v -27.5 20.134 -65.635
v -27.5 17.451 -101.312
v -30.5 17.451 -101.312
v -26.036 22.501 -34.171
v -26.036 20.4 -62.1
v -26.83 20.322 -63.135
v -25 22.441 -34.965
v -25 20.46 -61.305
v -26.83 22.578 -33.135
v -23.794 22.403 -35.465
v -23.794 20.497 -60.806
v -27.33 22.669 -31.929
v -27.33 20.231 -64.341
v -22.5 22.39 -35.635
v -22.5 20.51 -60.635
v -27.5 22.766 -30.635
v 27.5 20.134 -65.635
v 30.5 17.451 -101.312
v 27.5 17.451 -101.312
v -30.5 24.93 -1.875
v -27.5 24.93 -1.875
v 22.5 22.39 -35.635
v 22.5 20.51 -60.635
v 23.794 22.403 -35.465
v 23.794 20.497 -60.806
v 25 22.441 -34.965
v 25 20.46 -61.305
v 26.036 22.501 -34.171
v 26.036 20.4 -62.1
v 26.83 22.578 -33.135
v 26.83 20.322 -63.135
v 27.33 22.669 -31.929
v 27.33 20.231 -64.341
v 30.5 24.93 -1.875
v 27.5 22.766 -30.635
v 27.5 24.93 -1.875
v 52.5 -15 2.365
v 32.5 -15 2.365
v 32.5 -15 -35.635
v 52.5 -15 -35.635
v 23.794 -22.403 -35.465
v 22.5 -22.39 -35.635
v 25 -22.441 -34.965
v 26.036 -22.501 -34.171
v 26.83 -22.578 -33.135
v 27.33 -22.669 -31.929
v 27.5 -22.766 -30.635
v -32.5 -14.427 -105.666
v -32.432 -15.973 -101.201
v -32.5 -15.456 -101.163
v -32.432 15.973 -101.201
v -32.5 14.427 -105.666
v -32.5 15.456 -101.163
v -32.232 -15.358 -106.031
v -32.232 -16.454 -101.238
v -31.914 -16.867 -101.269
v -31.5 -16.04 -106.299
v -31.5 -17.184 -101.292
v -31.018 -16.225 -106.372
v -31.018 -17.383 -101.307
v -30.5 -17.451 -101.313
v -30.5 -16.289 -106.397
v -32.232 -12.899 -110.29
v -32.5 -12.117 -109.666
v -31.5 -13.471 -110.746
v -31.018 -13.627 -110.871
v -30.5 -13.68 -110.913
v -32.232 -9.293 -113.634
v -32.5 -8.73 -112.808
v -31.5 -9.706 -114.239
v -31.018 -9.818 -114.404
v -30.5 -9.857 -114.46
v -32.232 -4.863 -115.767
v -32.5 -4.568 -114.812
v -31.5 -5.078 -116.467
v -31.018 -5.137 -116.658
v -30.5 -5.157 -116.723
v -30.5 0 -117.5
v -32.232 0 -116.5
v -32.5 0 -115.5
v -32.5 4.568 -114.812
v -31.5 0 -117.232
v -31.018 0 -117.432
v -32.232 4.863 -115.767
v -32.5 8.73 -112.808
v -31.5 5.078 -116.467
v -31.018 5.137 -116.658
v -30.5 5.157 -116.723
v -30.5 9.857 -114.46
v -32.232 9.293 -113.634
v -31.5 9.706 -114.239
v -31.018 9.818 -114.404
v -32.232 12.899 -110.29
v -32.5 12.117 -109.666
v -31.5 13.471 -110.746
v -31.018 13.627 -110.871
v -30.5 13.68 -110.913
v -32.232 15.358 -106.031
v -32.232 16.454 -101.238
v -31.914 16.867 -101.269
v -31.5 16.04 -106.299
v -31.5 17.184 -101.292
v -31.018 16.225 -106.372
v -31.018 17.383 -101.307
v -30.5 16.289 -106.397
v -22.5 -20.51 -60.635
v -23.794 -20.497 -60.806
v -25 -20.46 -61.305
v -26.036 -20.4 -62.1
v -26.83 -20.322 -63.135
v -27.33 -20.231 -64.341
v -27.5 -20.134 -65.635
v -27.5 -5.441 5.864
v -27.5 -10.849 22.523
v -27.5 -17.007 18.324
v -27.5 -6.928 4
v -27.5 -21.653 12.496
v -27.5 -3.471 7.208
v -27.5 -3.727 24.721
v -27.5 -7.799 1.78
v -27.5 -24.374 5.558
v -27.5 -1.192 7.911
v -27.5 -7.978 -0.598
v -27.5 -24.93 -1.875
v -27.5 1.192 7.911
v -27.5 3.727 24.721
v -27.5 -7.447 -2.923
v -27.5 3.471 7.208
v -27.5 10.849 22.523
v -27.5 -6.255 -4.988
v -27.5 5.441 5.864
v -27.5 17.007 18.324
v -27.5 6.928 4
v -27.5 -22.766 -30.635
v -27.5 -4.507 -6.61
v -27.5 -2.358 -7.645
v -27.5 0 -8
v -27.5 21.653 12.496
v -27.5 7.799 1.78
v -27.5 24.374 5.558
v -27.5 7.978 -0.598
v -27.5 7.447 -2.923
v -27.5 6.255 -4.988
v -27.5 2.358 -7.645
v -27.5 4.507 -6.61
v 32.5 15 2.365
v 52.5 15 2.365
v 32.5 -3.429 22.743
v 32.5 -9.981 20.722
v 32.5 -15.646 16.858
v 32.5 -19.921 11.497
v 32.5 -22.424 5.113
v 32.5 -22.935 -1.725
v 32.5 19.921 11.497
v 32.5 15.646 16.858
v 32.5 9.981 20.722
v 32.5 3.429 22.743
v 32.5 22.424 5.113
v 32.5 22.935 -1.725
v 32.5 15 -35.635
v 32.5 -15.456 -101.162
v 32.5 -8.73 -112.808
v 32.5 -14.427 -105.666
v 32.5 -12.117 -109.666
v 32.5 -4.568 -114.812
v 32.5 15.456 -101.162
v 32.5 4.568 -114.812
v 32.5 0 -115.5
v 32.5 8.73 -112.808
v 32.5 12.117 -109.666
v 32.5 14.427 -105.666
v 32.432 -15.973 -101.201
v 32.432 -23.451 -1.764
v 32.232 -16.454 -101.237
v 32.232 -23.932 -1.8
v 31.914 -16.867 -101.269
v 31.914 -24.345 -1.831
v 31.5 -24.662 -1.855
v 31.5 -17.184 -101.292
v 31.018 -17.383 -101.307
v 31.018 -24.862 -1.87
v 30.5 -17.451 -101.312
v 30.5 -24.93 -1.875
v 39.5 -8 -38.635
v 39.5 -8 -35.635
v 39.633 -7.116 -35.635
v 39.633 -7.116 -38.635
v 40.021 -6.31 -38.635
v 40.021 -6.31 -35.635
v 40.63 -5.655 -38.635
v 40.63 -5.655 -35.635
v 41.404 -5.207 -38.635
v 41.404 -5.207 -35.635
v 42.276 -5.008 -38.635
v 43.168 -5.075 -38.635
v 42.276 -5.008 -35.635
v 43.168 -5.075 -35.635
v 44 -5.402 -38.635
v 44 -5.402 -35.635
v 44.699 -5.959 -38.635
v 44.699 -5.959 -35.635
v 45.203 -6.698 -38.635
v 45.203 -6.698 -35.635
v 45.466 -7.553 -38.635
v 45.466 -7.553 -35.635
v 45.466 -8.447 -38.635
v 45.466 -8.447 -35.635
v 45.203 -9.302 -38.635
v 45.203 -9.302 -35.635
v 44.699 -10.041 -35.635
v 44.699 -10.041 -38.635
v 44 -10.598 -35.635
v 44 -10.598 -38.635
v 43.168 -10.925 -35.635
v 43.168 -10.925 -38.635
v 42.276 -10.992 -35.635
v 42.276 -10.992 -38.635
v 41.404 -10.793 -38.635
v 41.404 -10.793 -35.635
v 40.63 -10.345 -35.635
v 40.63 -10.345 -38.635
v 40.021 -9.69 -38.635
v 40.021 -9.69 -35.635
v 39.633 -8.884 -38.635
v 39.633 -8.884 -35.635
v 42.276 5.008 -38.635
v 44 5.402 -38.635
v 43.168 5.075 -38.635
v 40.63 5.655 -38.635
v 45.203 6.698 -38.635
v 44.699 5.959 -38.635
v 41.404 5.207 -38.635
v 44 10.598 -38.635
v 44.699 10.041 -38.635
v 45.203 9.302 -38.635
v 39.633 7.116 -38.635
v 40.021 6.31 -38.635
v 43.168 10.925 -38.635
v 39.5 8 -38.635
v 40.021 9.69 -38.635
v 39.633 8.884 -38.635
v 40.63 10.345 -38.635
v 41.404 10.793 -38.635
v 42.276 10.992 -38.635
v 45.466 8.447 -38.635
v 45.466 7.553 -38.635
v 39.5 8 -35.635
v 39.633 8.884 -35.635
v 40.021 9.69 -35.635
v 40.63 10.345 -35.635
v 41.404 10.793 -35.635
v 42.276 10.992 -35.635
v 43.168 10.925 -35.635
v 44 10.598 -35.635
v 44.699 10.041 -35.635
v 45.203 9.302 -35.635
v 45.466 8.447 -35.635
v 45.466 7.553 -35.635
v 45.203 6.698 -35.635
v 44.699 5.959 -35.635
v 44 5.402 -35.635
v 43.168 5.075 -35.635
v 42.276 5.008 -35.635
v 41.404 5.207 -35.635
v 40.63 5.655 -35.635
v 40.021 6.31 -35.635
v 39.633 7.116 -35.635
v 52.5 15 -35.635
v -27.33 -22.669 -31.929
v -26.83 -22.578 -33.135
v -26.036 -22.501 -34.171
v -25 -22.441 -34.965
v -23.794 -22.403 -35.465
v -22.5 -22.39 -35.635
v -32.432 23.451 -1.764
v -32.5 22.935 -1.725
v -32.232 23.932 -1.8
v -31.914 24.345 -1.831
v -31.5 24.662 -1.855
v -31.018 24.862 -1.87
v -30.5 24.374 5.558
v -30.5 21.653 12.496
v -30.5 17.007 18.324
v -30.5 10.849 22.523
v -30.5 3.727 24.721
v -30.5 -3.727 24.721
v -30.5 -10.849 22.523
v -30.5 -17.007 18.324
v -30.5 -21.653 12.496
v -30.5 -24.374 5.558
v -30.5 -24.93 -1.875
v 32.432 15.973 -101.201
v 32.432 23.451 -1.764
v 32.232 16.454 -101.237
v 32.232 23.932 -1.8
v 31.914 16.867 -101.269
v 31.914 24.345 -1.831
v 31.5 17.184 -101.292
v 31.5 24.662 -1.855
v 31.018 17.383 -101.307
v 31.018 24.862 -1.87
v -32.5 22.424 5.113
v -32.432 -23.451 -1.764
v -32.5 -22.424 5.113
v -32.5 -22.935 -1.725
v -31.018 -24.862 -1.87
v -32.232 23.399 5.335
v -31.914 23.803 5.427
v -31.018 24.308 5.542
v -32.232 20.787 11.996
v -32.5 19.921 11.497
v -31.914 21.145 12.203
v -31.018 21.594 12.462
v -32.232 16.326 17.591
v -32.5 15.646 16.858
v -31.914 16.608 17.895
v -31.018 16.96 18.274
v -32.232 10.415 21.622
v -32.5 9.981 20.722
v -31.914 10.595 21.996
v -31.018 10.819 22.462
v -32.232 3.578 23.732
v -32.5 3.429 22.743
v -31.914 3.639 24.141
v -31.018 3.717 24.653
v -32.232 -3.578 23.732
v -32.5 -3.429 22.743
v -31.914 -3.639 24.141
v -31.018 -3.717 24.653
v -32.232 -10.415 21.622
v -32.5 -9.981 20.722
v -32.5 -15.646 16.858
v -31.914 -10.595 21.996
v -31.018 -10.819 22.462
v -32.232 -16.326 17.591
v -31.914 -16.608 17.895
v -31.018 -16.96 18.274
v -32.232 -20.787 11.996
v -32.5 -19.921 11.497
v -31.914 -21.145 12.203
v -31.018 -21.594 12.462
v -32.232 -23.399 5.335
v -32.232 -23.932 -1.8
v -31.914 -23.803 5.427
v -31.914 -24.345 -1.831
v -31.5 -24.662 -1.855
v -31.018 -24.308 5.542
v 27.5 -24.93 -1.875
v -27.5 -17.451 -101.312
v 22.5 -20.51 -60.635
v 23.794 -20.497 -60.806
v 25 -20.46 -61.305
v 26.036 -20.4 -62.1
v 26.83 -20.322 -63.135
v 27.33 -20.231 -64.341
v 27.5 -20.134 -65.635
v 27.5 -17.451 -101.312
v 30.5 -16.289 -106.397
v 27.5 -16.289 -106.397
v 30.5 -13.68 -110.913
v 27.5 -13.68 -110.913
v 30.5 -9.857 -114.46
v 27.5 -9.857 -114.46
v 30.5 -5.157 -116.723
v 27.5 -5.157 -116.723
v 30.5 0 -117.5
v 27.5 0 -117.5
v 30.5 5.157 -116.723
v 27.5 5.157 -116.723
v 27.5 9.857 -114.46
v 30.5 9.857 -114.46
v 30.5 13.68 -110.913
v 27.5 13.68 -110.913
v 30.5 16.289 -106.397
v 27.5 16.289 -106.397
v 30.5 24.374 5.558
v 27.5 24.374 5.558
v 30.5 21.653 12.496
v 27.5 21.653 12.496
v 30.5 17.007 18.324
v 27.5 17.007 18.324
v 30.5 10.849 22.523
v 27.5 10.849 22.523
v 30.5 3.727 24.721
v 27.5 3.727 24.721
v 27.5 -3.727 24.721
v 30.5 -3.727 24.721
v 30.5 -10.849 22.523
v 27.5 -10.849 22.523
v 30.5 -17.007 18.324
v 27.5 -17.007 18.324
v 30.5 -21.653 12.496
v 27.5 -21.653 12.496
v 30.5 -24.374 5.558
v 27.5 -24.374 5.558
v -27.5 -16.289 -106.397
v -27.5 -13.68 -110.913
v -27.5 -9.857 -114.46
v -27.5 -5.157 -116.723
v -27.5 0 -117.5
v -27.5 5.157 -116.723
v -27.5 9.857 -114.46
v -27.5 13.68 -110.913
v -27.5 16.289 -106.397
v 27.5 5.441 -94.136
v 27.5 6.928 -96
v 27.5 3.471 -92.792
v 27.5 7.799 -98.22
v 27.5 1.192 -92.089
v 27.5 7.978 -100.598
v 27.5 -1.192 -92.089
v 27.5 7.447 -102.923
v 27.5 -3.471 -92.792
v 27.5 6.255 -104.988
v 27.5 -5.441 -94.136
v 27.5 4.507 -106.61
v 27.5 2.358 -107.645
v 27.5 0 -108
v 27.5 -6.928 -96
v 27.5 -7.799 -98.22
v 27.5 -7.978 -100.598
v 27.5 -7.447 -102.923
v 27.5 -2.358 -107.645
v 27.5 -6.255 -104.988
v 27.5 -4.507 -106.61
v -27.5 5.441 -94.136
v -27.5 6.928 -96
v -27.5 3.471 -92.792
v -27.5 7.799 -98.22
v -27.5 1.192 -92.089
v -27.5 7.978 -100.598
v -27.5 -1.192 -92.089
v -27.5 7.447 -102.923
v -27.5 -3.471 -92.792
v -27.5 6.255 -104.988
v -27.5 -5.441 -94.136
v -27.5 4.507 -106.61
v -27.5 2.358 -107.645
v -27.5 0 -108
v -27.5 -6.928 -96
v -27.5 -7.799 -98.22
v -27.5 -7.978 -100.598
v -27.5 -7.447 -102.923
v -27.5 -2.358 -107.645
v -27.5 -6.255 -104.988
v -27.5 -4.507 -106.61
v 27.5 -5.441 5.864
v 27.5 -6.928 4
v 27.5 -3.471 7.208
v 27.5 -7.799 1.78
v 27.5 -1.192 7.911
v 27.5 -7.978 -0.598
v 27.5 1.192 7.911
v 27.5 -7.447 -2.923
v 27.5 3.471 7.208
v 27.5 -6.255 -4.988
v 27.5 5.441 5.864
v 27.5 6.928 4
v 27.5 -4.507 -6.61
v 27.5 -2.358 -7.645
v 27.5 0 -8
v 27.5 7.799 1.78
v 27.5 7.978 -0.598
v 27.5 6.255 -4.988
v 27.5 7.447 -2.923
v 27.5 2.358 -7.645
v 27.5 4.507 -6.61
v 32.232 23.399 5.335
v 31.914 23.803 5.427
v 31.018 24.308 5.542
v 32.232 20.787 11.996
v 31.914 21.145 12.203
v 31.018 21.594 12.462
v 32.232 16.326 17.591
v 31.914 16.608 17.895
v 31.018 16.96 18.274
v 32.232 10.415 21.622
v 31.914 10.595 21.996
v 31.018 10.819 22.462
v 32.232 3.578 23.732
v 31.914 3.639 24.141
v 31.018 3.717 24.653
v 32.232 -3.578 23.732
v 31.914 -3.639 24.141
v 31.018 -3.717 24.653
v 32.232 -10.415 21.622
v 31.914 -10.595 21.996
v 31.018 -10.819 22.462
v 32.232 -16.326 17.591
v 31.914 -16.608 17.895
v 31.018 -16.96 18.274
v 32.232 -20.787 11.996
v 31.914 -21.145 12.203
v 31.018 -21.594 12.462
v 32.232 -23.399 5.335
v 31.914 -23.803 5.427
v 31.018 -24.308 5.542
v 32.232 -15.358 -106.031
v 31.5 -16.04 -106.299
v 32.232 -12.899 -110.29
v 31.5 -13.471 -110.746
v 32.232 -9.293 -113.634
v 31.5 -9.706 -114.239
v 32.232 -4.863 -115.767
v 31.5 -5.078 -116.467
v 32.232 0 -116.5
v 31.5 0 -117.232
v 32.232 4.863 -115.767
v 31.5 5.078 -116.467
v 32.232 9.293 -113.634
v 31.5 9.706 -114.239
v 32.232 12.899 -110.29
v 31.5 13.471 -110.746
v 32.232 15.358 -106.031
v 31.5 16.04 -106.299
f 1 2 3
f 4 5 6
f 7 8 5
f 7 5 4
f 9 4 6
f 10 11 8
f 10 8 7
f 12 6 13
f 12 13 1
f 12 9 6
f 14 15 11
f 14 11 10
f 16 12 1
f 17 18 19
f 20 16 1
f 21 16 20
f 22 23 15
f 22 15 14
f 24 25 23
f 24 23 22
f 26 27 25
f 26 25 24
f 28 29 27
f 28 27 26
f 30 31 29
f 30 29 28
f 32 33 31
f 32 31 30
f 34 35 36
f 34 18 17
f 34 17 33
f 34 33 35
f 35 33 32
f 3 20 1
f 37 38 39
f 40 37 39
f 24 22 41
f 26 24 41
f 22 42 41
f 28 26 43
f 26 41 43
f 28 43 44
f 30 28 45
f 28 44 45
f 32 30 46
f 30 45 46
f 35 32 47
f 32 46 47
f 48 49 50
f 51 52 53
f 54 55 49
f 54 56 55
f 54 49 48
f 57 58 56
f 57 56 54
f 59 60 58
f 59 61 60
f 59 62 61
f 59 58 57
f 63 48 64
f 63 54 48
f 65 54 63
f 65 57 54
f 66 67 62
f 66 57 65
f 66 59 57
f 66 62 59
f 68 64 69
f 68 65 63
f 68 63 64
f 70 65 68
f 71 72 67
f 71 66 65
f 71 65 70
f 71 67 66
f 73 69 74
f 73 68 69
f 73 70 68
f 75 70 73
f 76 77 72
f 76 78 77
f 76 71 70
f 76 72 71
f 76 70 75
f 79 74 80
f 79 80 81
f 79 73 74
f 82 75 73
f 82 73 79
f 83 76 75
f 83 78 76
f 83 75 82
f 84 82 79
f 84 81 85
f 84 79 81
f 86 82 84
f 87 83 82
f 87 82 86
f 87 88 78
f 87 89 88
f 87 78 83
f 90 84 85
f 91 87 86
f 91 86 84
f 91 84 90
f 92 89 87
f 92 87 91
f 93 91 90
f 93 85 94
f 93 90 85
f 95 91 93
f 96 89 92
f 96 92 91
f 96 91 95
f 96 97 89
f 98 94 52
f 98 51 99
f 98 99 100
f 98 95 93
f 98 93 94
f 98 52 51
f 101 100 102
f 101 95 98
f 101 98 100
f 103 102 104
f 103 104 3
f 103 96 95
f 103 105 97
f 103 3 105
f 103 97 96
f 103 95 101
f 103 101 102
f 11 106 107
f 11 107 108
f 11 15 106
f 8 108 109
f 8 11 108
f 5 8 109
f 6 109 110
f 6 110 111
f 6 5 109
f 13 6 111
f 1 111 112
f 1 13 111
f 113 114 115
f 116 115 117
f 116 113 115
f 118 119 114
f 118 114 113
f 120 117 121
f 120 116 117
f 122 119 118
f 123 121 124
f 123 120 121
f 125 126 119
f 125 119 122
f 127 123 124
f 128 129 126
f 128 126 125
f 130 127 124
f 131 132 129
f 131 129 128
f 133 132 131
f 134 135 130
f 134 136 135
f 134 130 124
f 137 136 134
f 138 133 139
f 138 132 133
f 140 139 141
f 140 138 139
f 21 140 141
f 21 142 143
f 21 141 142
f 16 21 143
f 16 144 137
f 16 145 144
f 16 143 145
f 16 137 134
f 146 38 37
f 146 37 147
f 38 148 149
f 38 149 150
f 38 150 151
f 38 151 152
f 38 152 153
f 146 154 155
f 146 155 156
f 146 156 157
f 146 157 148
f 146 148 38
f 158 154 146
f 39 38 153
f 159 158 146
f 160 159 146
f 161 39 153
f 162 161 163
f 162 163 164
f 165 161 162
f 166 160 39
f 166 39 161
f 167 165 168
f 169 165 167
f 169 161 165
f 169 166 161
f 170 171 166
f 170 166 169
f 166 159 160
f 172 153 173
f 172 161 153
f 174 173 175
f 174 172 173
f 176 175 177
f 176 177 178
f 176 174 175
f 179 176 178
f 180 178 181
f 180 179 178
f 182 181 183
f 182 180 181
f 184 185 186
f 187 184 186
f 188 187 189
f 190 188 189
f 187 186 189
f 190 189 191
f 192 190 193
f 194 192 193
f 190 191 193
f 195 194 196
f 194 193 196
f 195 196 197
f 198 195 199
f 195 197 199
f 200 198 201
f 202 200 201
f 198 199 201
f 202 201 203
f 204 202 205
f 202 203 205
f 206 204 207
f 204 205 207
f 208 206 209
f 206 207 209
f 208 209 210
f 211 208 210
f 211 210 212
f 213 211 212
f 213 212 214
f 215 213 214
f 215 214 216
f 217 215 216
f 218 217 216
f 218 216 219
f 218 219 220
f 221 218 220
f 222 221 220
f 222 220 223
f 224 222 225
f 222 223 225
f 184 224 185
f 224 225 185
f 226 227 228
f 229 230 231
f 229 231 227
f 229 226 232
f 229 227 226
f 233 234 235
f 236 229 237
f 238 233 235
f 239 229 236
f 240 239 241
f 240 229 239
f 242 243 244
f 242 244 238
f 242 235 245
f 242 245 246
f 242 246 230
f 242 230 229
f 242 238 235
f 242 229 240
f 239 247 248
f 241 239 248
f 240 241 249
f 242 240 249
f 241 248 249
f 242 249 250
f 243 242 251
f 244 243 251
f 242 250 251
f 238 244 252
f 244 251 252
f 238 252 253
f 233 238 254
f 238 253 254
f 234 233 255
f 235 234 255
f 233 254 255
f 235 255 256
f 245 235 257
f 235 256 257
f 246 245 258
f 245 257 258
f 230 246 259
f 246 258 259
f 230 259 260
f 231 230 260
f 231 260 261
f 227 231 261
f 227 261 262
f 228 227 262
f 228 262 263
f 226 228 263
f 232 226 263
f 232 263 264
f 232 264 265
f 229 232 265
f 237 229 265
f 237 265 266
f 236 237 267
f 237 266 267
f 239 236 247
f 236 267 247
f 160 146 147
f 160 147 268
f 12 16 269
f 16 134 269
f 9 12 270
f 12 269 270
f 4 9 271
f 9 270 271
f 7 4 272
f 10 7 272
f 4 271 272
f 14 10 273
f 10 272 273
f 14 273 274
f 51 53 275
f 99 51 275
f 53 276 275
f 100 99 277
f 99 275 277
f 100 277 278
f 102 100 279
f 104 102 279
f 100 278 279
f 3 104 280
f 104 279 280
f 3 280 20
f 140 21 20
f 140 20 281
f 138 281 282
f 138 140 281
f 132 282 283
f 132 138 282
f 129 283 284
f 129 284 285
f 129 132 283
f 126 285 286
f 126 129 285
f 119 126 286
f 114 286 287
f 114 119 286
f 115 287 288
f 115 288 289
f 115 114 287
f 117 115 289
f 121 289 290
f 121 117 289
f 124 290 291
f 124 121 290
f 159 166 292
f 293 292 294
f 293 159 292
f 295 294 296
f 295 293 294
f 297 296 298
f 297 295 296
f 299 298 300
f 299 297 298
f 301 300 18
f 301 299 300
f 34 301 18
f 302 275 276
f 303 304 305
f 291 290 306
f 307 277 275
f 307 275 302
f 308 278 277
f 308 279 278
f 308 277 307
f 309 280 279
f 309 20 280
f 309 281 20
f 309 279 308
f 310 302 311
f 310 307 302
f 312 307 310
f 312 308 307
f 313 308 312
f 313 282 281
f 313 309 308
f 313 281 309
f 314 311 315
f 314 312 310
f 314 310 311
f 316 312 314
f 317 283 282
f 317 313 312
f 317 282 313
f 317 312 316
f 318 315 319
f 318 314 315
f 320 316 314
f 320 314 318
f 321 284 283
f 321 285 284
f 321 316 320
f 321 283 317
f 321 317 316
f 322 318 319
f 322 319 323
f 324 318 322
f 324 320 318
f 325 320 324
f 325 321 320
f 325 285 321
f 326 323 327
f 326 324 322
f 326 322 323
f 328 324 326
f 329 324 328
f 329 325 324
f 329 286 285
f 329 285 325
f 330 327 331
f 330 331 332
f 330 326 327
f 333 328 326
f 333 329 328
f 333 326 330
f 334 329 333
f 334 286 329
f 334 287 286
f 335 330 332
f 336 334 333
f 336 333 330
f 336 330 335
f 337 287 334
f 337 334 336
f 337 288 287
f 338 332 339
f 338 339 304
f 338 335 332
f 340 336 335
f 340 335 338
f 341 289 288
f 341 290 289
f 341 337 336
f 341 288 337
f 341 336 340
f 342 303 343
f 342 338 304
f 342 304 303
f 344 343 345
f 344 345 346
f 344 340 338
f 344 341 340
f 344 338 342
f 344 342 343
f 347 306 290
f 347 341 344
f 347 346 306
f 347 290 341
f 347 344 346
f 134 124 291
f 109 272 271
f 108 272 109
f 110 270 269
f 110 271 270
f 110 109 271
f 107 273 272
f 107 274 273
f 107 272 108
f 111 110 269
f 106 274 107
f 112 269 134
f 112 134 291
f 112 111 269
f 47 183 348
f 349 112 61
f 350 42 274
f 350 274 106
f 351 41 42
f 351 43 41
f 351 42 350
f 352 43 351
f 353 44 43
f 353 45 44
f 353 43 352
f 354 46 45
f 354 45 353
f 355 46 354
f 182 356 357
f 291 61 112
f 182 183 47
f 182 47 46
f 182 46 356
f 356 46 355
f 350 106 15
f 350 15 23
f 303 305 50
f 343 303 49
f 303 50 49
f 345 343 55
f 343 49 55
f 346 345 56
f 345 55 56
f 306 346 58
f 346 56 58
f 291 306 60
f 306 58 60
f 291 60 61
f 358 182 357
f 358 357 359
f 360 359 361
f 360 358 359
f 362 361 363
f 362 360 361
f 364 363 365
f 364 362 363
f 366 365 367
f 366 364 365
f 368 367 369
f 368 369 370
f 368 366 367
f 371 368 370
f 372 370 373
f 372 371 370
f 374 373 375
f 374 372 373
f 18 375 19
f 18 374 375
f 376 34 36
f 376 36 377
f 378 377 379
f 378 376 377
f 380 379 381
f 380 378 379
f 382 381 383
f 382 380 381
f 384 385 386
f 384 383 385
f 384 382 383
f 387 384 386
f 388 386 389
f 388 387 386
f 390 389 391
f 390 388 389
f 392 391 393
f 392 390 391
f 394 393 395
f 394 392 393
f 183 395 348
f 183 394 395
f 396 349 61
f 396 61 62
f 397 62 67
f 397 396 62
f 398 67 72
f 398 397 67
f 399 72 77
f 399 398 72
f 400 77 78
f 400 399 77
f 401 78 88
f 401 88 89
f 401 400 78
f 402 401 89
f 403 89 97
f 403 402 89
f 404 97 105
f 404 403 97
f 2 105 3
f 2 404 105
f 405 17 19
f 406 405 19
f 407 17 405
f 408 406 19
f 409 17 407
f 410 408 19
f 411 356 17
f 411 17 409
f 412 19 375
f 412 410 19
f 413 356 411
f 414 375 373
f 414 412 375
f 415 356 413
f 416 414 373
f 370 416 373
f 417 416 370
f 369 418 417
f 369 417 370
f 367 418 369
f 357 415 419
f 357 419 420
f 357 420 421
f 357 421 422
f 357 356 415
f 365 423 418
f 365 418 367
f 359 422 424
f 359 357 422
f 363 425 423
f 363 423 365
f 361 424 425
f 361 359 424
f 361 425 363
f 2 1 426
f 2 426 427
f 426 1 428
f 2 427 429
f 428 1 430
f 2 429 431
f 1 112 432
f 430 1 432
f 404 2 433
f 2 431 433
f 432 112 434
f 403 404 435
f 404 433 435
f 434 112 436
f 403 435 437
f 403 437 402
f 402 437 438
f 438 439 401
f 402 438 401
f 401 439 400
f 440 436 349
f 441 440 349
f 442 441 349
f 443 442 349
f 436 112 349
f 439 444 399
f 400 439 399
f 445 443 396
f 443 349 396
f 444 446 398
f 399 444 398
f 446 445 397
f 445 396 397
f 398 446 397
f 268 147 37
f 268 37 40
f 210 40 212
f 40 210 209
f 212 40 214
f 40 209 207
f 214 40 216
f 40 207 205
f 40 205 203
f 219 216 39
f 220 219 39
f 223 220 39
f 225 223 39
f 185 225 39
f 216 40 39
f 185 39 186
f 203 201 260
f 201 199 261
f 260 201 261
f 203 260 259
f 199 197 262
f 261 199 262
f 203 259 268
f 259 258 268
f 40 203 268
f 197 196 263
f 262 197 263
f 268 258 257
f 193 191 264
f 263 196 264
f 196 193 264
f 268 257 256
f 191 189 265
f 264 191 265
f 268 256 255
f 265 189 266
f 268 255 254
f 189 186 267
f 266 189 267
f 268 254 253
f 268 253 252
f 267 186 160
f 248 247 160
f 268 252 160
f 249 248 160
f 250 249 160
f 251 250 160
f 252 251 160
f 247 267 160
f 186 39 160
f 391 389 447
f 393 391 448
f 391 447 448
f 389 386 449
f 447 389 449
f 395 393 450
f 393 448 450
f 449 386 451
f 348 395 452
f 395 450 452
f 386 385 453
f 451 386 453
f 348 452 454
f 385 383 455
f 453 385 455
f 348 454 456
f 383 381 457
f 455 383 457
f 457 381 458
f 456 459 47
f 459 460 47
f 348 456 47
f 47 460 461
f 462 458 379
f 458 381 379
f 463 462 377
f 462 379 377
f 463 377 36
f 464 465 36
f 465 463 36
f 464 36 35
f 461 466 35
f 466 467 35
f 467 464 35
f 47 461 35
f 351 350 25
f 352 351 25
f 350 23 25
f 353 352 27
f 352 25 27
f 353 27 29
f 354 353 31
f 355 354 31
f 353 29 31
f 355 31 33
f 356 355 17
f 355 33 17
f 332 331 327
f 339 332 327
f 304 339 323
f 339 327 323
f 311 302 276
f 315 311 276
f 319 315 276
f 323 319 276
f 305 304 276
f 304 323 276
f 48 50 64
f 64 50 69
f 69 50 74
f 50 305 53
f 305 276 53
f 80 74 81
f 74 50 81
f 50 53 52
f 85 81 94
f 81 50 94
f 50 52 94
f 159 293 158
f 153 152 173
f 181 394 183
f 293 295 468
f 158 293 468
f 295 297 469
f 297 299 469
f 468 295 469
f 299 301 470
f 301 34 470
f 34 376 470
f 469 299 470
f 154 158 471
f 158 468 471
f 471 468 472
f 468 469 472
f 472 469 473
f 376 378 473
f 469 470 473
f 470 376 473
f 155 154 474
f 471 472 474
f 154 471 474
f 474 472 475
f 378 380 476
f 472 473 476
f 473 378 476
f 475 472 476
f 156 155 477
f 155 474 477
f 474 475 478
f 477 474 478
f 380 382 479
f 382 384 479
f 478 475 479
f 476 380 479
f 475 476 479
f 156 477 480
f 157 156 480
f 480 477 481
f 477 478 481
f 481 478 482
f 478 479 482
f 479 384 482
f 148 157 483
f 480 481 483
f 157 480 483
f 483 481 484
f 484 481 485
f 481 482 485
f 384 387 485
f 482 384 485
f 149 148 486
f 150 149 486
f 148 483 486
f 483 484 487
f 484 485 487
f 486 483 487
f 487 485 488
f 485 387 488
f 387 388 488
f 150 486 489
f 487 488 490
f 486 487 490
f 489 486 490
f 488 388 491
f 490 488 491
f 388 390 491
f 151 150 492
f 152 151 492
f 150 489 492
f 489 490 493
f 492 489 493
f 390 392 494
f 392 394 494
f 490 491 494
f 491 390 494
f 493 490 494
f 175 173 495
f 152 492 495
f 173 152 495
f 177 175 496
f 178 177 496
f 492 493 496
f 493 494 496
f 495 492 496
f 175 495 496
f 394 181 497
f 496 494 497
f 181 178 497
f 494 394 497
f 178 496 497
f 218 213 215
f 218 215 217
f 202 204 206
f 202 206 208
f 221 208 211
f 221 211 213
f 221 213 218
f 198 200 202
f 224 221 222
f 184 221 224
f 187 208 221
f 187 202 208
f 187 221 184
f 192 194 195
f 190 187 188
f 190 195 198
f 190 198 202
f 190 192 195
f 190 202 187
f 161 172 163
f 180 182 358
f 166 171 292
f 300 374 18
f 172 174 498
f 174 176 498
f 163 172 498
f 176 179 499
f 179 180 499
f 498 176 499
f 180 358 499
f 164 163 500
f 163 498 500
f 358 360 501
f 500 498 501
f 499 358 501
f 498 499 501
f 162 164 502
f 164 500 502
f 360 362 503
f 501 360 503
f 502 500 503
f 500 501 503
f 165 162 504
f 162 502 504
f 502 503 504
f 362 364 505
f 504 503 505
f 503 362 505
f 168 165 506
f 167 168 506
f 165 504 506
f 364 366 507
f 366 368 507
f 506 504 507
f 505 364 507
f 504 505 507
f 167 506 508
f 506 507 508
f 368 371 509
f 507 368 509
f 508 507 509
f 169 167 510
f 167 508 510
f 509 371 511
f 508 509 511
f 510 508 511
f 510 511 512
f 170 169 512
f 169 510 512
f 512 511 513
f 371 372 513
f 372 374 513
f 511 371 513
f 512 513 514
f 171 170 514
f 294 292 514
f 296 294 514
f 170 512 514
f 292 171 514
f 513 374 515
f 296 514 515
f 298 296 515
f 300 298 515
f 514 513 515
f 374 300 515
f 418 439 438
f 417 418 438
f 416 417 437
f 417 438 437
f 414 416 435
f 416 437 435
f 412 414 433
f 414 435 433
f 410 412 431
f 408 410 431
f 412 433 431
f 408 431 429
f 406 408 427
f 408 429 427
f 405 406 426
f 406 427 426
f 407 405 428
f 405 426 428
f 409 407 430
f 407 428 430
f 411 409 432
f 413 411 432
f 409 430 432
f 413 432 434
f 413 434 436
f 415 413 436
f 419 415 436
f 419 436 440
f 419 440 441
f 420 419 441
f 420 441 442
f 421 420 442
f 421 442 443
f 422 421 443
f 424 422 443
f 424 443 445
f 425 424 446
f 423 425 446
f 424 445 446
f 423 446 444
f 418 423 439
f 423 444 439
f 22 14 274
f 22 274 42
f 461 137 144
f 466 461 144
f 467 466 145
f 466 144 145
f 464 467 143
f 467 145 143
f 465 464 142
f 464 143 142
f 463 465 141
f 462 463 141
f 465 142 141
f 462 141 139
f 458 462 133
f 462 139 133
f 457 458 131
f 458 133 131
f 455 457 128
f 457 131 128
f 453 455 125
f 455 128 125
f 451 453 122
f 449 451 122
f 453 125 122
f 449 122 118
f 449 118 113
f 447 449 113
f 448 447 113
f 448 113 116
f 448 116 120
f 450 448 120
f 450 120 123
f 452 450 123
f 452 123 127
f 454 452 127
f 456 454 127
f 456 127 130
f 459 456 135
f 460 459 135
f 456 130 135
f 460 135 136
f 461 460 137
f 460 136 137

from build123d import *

# Parameters (mm, degrees)
BOSS_EXTRUDE1_DEPTH = 32.5
SKETCH2_W           = 55
SKETCH2_H           = 56.864750755
SKETCH2_H_2         = 60.635249245
CUT_EXTRUDE1_DEPTH  = 32.5
SKETCH4_R           = 8
BOSS_EXTRUDE2_DEPTH = 55
SKETCH5_W           = 38
SKETCH5_H           = 30
BOSS_EXTRUDE3_DEPTH = 20
SKETCH6_R           = 3
BOSS_EXTRUDE4_DEPTH = 3
FILLET1_R           = 2
FILLET3_R           = 2
FILLET5_R           = 5
FILLET6_R           = 5
FILLET7_R           = 5
FILLET8_R           = 5


with BuildPart() as part:
    # Sketch1 → Boss-Extrude1 (new body, symmetric)
    with BuildSketch(Plane(origin=(0, 0, 0), x_dir=(0, 0, -1), z_dir=(1, 0, 0))):
        with BuildLine():
            Line((1.875, -24.929588344), (101.3125, -17.450711841))
            ThreePointArc((101.3125, -17.450711841), (117.5, 0), (101.3125, 17.450711841))
            Line((101.3125, 17.450711841), (1.875, 24.929588344))
            ThreePointArc((1.875, 24.929588344), (-25, 0), (1.875, -24.929588344))
        make_face()
    extrude(amount=BOSS_EXTRUDE1_DEPTH, both=True)

    # Sketch2 → Cut-Extrude1 (cut, symmetric)
    with BuildSketch(Plane(origin=(0, 0, 0), x_dir=(1, 0, 0), z_dir=(0, 1, 0))):
        with Locations((0, 89.067624623)):
            Rectangle(SKETCH2_W, SKETCH2_H)
        with Locations((0, 5.317624623)):
            Rectangle(SKETCH2_W, SKETCH2_H_2)
    extrude(amount=CUT_EXTRUDE1_DEPTH, both=True, mode=Mode.SUBTRACT)

    # Sketch4 → Boss-Extrude2 (add)
    with BuildSketch(Plane(origin=(-27.5, 0, 0), x_dir=(0, 0, -1), z_dir=(1, 0, 0))):
        Circle(SKETCH4_R)
        with Locations((100, 0)):
            Circle(SKETCH4_R)
    extrude(amount=BOSS_EXTRUDE2_DEPTH)

    # Sketch5 → Boss-Extrude3 (add)
    with BuildSketch(Plane(origin=(32.5, 0, 0), x_dir=(0, 0, -1), z_dir=(1, 0, 0))):
        with Locations((16.635249245, 0)):
            Rectangle(SKETCH5_W, SKETCH5_H)
    extrude(amount=BOSS_EXTRUDE3_DEPTH)

    # Sketch6 → Boss-Extrude4 (add)
    with BuildSketch(Plane(origin=(0, 0, -35.635249245), x_dir=(-1, 0, 0), z_dir=(0, 0, -1))):
        with Locations((-42.5, 8)):
            Circle(SKETCH6_R)
        with Locations((-42.5, -8)):
            Circle(SKETCH6_R)
    extrude(amount=BOSS_EXTRUDE4_DEPTH)

    # Fillet1
    fillet1_edges = [part.edges().sort_by_distance(p)[0] for p in [
        (32.5, 0, -117.5),
        (32.5, 21.190150092, -51.59375),
        (32.5, 0, 25),
        (32.5, -21.190150092, -51.59375),
    ]]
    fillet(fillet1_edges, radius=FILLET1_R)

    # Fillet3
    fillet3_edges = [part.edges().sort_by_distance(p)[0] for p in [
        (-32.5, 21.190150092, -51.59375),
        (-32.5, 0, -117.5),
        (-32.5, -21.190150092, -51.59375),
        (-32.5, 0, 25),
    ]]
    fillet(fillet3_edges, radius=FILLET3_R)

    # Fillet5
    fillet5_edges = [part.edges().sort_by_distance(p)[0] for p in [
        (27.5, 0, -60.635249245),
    ]]
    fillet(fillet5_edges, radius=FILLET5_R)

    # Fillet6
    fillet6_edges = [part.edges().sort_by_distance(p)[0] for p in [
        (-27.5, 0, -60.635249245),
    ]]
    fillet(fillet6_edges, radius=FILLET6_R)

    # Fillet7
    fillet7_edges = [part.edges().sort_by_distance(p)[0] for p in [
        (-27.5, 0, -35.635249245),
    ]]
    fillet(fillet7_edges, radius=FILLET7_R)

    # Fillet8
    fillet8_edges = [part.edges().sort_by_distance(p)[0] for p in [
        (27.5, 0, -35.635249245),
    ]]
    fillet(fillet8_edges, radius=FILLET8_R)


solid = part.part
